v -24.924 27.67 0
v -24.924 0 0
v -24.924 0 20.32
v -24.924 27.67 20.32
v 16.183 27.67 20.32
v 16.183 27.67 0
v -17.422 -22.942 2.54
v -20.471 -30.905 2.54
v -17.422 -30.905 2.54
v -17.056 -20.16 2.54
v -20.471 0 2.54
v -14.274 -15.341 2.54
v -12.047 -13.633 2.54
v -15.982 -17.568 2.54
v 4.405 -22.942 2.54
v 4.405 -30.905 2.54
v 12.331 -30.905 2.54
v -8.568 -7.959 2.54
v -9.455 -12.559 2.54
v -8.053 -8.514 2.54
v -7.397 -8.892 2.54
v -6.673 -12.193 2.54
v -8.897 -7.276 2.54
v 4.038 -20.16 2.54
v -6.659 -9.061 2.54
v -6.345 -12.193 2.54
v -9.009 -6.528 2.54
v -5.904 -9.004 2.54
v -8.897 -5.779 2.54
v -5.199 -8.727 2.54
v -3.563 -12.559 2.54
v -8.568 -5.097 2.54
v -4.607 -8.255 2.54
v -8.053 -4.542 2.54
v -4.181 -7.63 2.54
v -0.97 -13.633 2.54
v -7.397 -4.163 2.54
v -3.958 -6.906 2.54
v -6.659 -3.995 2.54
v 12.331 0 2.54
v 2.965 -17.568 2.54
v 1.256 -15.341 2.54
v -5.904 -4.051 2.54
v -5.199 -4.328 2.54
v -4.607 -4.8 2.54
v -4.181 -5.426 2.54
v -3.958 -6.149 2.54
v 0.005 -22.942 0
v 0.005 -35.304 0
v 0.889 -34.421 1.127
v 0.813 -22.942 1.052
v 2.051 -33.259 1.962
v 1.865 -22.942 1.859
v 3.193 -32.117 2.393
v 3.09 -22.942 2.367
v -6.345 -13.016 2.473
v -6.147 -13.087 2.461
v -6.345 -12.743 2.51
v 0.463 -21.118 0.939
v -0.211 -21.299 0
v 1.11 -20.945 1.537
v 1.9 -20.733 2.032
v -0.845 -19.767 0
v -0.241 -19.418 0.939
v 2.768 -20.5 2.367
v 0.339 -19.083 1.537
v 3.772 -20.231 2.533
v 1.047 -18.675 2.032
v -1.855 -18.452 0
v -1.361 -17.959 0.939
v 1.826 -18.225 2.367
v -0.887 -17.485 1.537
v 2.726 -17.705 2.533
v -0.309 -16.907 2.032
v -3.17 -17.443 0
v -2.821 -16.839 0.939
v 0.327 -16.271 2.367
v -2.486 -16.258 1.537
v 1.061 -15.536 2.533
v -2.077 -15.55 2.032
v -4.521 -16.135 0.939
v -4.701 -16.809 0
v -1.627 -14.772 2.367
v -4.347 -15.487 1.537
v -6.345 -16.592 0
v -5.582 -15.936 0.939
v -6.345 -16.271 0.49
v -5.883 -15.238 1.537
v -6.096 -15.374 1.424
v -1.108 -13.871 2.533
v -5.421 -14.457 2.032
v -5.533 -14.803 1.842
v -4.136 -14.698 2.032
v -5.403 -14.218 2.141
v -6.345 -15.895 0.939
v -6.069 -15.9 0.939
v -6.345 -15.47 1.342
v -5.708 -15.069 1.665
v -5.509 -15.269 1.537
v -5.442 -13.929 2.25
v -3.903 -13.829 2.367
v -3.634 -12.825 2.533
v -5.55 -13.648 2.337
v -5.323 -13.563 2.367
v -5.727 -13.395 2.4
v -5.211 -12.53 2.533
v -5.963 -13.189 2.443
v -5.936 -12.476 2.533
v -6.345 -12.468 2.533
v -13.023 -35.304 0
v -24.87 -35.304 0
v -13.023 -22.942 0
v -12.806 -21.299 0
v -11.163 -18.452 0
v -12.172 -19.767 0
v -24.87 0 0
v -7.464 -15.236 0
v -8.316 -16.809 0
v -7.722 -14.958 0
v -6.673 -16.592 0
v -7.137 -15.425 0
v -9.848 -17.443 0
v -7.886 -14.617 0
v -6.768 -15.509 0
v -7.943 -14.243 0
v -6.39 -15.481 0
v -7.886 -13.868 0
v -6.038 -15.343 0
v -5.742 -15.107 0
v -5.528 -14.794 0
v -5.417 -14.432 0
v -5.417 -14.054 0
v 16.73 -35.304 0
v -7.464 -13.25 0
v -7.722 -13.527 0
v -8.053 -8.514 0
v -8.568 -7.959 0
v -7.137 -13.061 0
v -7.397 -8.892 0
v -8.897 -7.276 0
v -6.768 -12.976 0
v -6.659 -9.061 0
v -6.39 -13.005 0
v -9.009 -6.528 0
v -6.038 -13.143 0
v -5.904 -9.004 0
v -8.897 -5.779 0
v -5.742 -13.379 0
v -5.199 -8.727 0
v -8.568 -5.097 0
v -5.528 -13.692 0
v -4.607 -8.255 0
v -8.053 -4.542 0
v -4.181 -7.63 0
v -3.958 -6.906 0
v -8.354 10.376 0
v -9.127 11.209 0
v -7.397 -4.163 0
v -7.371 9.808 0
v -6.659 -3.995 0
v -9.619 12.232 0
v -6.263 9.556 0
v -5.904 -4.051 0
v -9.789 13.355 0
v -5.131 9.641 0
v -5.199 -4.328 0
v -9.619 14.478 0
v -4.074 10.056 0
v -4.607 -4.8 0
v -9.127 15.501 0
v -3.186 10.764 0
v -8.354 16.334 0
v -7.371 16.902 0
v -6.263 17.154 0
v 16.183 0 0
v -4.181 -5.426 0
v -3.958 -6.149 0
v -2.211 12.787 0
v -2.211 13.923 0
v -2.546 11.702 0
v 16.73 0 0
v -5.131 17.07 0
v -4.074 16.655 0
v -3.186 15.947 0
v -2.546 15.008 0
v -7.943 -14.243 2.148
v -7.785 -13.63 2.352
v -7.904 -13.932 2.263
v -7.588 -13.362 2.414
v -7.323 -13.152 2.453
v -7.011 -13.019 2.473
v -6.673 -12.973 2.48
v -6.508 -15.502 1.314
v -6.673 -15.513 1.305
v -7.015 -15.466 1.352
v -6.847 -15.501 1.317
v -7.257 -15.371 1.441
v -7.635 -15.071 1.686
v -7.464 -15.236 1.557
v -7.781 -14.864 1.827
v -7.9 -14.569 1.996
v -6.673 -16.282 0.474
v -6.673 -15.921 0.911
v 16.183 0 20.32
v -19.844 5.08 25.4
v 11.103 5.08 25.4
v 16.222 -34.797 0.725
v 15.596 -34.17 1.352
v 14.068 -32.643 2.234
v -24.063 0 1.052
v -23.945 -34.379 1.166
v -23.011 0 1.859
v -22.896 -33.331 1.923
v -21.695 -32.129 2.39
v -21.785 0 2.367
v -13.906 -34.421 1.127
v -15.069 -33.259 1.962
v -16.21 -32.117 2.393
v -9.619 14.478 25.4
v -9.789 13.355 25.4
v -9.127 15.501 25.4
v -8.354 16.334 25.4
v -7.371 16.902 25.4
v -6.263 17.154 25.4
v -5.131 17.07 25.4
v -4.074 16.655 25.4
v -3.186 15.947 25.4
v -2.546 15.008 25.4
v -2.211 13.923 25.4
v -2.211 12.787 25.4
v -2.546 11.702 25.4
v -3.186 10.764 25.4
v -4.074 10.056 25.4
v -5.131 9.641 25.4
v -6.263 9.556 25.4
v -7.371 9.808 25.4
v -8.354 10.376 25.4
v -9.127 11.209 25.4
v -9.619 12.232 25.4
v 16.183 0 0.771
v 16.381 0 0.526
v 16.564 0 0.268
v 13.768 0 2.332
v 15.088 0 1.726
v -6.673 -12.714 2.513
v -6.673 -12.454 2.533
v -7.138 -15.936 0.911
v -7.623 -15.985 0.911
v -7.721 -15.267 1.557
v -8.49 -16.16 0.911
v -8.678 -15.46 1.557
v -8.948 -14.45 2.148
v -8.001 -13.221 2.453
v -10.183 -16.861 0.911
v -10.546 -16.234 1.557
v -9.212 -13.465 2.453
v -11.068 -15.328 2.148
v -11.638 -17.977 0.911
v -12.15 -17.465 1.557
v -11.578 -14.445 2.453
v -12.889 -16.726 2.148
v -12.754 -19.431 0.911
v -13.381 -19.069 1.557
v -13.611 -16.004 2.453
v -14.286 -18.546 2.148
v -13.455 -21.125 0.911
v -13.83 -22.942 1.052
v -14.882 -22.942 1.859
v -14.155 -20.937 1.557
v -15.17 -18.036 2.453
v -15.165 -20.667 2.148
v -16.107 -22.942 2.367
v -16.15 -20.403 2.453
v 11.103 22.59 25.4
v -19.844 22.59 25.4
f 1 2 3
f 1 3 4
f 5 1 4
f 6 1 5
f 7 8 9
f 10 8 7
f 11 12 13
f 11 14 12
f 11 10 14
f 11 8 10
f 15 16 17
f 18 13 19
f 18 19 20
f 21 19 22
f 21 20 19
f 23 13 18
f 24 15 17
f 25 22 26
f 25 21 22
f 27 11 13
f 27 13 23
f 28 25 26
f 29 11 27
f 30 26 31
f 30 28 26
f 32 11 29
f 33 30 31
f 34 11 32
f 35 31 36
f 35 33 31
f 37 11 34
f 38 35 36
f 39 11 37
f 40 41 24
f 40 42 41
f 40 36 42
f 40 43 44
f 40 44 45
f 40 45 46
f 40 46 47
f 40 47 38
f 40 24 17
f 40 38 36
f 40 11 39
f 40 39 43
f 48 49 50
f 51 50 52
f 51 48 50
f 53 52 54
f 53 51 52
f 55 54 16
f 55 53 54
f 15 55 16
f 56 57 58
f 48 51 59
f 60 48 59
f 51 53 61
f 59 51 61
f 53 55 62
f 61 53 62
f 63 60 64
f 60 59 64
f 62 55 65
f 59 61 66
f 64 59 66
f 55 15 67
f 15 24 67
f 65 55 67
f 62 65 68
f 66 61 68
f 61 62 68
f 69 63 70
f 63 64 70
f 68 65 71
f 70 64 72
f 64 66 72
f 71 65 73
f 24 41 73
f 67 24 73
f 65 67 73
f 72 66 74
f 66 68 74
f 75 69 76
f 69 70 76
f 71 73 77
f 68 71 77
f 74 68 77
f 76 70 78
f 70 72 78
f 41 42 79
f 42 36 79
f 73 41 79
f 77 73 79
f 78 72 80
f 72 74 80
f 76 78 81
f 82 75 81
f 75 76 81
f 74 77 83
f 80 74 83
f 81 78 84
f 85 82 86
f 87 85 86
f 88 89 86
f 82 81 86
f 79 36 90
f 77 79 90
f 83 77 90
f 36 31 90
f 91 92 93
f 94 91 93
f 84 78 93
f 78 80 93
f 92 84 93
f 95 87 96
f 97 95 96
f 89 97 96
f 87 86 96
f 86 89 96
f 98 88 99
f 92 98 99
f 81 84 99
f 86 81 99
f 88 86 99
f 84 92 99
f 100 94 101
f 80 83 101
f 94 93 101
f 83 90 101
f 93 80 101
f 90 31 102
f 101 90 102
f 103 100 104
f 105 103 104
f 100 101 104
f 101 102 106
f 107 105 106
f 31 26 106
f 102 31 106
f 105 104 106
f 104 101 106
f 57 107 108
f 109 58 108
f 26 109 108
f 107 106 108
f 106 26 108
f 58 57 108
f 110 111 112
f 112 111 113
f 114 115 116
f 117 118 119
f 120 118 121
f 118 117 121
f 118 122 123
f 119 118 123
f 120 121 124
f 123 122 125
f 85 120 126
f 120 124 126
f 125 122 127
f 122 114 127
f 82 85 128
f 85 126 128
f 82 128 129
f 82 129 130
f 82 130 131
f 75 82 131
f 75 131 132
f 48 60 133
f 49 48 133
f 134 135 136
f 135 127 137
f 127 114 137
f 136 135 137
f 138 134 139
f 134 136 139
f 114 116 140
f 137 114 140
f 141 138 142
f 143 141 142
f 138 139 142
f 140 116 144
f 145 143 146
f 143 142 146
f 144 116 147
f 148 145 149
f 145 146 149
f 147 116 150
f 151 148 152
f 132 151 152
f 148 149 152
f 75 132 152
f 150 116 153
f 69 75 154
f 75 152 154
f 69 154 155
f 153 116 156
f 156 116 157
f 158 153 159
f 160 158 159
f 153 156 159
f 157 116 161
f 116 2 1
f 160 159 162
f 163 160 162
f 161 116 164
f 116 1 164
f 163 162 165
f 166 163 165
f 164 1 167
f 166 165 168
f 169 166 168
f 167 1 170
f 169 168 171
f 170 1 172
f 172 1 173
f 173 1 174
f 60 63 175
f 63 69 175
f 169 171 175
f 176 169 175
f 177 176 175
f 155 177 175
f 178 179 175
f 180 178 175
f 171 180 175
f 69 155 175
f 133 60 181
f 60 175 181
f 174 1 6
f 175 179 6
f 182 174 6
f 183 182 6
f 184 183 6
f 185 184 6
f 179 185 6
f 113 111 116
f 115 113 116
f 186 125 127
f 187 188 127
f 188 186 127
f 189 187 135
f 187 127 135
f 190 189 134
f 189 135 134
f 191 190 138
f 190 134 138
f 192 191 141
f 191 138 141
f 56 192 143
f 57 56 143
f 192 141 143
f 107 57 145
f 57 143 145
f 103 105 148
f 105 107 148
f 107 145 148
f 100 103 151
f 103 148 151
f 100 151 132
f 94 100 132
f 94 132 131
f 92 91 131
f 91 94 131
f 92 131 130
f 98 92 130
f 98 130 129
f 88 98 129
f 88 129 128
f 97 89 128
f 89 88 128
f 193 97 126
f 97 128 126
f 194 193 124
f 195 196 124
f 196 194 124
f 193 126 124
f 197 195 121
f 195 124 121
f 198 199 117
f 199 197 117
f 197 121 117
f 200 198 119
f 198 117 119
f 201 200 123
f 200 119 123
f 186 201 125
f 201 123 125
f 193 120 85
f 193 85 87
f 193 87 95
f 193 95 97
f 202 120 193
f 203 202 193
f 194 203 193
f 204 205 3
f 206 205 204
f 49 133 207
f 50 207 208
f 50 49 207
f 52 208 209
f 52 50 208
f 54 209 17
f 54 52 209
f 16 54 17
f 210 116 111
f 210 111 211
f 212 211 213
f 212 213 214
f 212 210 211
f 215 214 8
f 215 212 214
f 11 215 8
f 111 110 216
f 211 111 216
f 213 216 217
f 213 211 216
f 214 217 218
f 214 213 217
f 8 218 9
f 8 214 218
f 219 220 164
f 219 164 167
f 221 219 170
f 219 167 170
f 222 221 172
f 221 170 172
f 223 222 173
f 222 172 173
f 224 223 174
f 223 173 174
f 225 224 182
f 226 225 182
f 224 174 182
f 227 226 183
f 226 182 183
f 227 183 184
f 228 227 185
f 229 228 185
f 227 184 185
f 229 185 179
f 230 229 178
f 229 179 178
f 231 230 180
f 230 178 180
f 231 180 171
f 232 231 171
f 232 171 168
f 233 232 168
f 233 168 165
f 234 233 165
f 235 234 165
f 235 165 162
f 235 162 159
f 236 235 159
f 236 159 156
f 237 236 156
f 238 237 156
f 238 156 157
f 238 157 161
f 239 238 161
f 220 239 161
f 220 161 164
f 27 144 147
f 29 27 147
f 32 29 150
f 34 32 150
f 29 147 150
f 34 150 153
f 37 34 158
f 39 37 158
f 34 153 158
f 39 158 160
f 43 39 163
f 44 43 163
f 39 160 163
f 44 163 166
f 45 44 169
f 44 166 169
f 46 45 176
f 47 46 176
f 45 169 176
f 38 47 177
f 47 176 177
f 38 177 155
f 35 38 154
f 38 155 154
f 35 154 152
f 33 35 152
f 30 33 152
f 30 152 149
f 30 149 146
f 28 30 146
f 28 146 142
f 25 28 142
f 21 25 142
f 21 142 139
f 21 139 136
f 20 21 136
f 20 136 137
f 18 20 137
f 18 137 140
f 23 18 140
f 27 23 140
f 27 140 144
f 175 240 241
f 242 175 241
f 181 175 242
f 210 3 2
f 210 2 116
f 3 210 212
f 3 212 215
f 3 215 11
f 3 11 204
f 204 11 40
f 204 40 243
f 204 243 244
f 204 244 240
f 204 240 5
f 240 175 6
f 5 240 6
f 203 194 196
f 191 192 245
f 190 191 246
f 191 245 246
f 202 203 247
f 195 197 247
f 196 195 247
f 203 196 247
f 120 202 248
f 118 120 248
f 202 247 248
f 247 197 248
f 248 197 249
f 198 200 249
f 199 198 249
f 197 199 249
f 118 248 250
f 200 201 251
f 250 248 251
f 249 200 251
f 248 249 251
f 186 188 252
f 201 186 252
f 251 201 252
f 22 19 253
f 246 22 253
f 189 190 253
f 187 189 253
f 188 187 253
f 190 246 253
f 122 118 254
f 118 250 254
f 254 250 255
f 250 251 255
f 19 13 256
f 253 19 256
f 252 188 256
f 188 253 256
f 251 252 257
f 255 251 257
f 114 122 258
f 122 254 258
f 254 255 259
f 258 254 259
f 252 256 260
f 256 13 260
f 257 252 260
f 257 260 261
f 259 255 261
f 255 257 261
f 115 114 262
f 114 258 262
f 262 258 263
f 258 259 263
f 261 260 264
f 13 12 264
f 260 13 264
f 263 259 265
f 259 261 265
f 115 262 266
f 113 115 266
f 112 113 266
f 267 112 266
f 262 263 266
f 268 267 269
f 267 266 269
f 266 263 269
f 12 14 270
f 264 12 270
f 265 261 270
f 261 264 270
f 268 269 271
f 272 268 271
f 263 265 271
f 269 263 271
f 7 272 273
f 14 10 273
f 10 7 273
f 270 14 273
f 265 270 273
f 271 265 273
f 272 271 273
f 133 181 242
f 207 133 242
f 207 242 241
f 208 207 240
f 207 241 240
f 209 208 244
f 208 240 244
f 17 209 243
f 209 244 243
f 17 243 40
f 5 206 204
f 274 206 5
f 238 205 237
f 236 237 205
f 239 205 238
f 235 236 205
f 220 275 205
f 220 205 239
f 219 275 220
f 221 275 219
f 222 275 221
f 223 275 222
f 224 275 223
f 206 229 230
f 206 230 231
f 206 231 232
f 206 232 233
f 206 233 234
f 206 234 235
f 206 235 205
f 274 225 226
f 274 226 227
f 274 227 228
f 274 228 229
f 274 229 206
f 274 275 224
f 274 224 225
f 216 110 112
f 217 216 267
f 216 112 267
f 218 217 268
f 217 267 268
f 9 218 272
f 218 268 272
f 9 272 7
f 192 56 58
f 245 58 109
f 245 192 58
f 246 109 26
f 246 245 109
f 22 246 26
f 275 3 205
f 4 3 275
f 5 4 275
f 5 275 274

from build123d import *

# Parameters (mm, degrees)
F0_W          = 41.1070454866
F0_H          = 27.6698879898
F1_DEPTH      = 25.4
F2_W          = 41.600080207
F2_H          = 35.3044494987
F3_DEPTH      = 2.54
F5_DEPTH      = 25.4
F7_D          = 7.62
F7_DEPTH      = 508
F7_TIP        = 2.2892789585
F9_D          = 2.54
F9_DEPTH      = 508
F9_TIP        = 0.7630929862
F11_D         = 5.08
F11_DEPTH     = 508
F11_TIP       = 1.5261859723
F12_SIZE      = 5.08
F13_T1_DEPTH  = 46.3029721267
F13_T3_DEPTH  = 38.7218051595
F13_T5_DEPTH  = 33.8444602975
F13_T7_DEPTH  = 23.3607587036
F13_T9_DEPTH  = 0.3279052623
F13_T12_ANGLE = 90
F13_T14_ANGLE = 90


# Not quite as in the source:
# - a fillet or chamfer that OpenCascade refuses, or shapes differently, is made with other operations: its cross-section is extruded or revolved along the edge and cut away or added


with BuildPart() as f1:
    # F0 (on Top) → F1 (new body)
    with BuildSketch(Plane.XY):
        with Locations((-4.3705804273, 13.8349439949)):
            Rectangle(F0_W, F0_H)
    extrude(amount=F1_DEPTH)

    # F2 (on Top) → F3 (join)
    with BuildSketch(Plane.XY):
        with Locations((-4.0700184181, -17.6522247493)):
            Rectangle(F2_W, F2_H)
    extrude(amount=F3_DEPTH)

    # F4 (on face) → F5 (cut)
    with BuildSketch(Plane.XY.offset(2.54)):
        with BuildLine():
            Line((-13.0226434802, -22.9422134231), (-13.0226434802, -45.534973538))
            Line((-13.0226434802, -45.534973538), (0.005261782, -45.534973538))
            Line((0.005261782, -45.534973538), (0.005261782, -22.9422134231))
            ThreePointArc((0.005261782, -22.9422134231), (-1.8546101574, -18.4520853626), (-6.344738218, -16.5922134231))
            Line((-6.344738218, -16.5922134231), (-6.6726434802, -16.5922134231))
            ThreePointArc((-6.6726434802, -16.5922134231), (-11.1627715408, -18.4520853626), (-13.0226434802, -22.9422134231))
        make_face()
    extrude(amount=-F5_DEPTH, mode=Mode.SUBTRACT)

    # F7
    with Locations(Plane.XY.offset(25.4)):
        with Locations((-5.9787402861, 13.3550977334)):
            Hole(F7_D / 2, depth=F7_DEPTH)
            with Locations((0, 0, -(F7_DEPTH + F7_TIP / 2))):  # 118° drill point
                Cone(0, F7_D / 2, F7_TIP, mode=Mode.SUBTRACT)

    # F9
    with Locations(Plane.XY.offset(2.54)):
        with Locations((-6.6726434802, -14.2427943647)):
            Hole(F9_D / 2, depth=F9_DEPTH)
            with Locations((0, 0, -(F9_DEPTH + F9_TIP / 2))):  # 118° drill point
                Cone(0, F9_D / 2, F9_TIP, mode=Mode.SUBTRACT)

    # F11
    with Locations(Plane.XY.offset(2.54)):
        with Locations((-6.4694355242, -6.5277060494)):
            Hole(F11_D / 2, depth=F11_DEPTH)
            with Locations((0, 0, -(F11_DEPTH + F11_TIP / 2))):  # 118° drill point
                Cone(0, F11_D / 2, F11_TIP, mode=Mode.SUBTRACT)

    # F12
    f12_edges = [f1.edges().sort_by_distance(p)[0] for p in [
        (-4.37058, 0, 25.4),
        (16.182942, 13.834944, 25.4),
        (-4.37058, 27.669888, 25.4),
        (-24.924103, 13.834944, 25.4),
    ]]
    chamfer(f12_edges, length=F12_SIZE)

    # F13: fillet of radius 5.08 on 5 edges, made by hand

    # F13_s2 → F13_t1 (cut)
    with BuildSketch(Plane.XZ):
        with BuildLine():
            ThreePointArc((16.7300216854, 0), (14.8706126341, 1.8594090512), (12.3306126341, 2.54))
            Line((12.3306126341, 2.54), (16.7300216854, 2.54))
            Line((16.7300216854, 2.54), (16.7300216854, 0))
        make_face()
        with BuildLine():
            ThreePointArc((-24.8700585216, 0), (-23.0106494704, 1.8594090512), (-20.4706494704, 2.54))
            Line((-20.4706494704, 2.54), (-24.8700585216, 2.54))
            Line((-24.8700585216, 2.54), (-24.8700585216, 0))
        make_face()
    extrude(amount=F13_T1_DEPTH, mode=Mode.SUBTRACT)

    # F13_s4 → F13_t3 (cut)
    with BuildSketch(Plane.YZ.offset(-10.993260846)):
        with BuildLine():
            ThreePointArc((-35.3044494987, 0), (-33.4450404474, 1.8594090512), (-30.9050404474, 2.54))
            Line((-30.9050404474, 2.54), (-35.3044494987, 2.54))
            Line((-35.3044494987, 2.54), (-35.3044494987, 0))
        make_face()
    extrude(amount=F13_T3_DEPTH, mode=Mode.SUBTRACT)

    # F13_s6 → F13_t5 (cut)
    with BuildSketch(Plane.YZ.offset(-35.8685811497)):
        with BuildLine():
            ThreePointArc((-35.3044494987, 0), (-33.4450404474, 1.8594090512), (-30.9050404474, 2.54))
            Line((-30.9050404474, 2.54), (-35.3044494987, 2.54))
            Line((-35.3044494987, 2.54), (-35.3044494987, 0))
        make_face()
    extrude(amount=F13_T5_DEPTH, mode=Mode.SUBTRACT)

    # F13_s8 → F13_t7 (cut)
    with BuildSketch(Plane.XZ.offset(22.9422134231)):
        with BuildLine():
            ThreePointArc((0.005261782, 0), (1.8646708333, 1.8594090512), (4.4046708333, 2.54))
            Line((4.4046708333, 2.54), (0.005261782, 2.54))
            Line((0.005261782, 2.54), (0.005261782, 0))
        make_face()
        with BuildLine():
            ThreePointArc((-13.0226434802, 0), (-14.8820525315, 1.8594090512), (-17.4220525315, 2.54))
            Line((-17.4220525315, 2.54), (-13.0226434802, 2.54))
            Line((-13.0226434802, 2.54), (-13.0226434802, 0))
        make_face()
    extrude(amount=F13_T7_DEPTH, mode=Mode.SUBTRACT)

    # F13_s10 → F13_t9 (cut)
    with BuildSketch(Plane.YZ.offset(-6.6726434802)):
        with BuildLine():
            ThreePointArc((-16.5922134231, 0), (-14.7328043719, 1.8594090512), (-12.1928043719, 2.54))
            Line((-12.1928043719, 2.54), (-16.5922134231, 2.54))
            Line((-16.5922134231, 2.54), (-16.5922134231, 0))
        make_face()
    extrude(amount=F13_T9_DEPTH, mode=Mode.SUBTRACT)

    # F13_s11 → F13_t12 (revolve, cut)
    with BuildSketch(Plane.XZ.offset(22.9422134231)):
        with BuildLine():
            ThreePointArc((0.005261782, 0), (1.8646708333, 1.8594090512), (4.4046708333, 2.54))
            Line((4.4046708333, 2.54), (0.005261782, 2.54))
            Line((0.005261782, 2.54), (0.005261782, 0))
        make_face()
    revolve(axis=Axis((-6.344738218, -22.9422134231, 2.54), (0, 0, 1)), revolution_arc=F13_T12_ANGLE, mode=Mode.SUBTRACT)

    # F13_s13 → F13_t14 (revolve, cut)
    with BuildSketch(Plane.YZ.offset(-6.6726434802)):
        with BuildLine():
            ThreePointArc((-16.5922134231, 0), (-14.7328043719, 1.8594090512), (-12.1928043719, 2.54))
            Line((-12.1928043719, 2.54), (-16.5922134231, 2.54))
            Line((-16.5922134231, 2.54), (-16.5922134231, 0))
        make_face()
    revolve(axis=Axis((-6.6726434802, -22.9422134231, 2.54), (0, 0, 1)), revolution_arc=F13_T14_ANGLE, mode=Mode.SUBTRACT)


solid = f1.part
